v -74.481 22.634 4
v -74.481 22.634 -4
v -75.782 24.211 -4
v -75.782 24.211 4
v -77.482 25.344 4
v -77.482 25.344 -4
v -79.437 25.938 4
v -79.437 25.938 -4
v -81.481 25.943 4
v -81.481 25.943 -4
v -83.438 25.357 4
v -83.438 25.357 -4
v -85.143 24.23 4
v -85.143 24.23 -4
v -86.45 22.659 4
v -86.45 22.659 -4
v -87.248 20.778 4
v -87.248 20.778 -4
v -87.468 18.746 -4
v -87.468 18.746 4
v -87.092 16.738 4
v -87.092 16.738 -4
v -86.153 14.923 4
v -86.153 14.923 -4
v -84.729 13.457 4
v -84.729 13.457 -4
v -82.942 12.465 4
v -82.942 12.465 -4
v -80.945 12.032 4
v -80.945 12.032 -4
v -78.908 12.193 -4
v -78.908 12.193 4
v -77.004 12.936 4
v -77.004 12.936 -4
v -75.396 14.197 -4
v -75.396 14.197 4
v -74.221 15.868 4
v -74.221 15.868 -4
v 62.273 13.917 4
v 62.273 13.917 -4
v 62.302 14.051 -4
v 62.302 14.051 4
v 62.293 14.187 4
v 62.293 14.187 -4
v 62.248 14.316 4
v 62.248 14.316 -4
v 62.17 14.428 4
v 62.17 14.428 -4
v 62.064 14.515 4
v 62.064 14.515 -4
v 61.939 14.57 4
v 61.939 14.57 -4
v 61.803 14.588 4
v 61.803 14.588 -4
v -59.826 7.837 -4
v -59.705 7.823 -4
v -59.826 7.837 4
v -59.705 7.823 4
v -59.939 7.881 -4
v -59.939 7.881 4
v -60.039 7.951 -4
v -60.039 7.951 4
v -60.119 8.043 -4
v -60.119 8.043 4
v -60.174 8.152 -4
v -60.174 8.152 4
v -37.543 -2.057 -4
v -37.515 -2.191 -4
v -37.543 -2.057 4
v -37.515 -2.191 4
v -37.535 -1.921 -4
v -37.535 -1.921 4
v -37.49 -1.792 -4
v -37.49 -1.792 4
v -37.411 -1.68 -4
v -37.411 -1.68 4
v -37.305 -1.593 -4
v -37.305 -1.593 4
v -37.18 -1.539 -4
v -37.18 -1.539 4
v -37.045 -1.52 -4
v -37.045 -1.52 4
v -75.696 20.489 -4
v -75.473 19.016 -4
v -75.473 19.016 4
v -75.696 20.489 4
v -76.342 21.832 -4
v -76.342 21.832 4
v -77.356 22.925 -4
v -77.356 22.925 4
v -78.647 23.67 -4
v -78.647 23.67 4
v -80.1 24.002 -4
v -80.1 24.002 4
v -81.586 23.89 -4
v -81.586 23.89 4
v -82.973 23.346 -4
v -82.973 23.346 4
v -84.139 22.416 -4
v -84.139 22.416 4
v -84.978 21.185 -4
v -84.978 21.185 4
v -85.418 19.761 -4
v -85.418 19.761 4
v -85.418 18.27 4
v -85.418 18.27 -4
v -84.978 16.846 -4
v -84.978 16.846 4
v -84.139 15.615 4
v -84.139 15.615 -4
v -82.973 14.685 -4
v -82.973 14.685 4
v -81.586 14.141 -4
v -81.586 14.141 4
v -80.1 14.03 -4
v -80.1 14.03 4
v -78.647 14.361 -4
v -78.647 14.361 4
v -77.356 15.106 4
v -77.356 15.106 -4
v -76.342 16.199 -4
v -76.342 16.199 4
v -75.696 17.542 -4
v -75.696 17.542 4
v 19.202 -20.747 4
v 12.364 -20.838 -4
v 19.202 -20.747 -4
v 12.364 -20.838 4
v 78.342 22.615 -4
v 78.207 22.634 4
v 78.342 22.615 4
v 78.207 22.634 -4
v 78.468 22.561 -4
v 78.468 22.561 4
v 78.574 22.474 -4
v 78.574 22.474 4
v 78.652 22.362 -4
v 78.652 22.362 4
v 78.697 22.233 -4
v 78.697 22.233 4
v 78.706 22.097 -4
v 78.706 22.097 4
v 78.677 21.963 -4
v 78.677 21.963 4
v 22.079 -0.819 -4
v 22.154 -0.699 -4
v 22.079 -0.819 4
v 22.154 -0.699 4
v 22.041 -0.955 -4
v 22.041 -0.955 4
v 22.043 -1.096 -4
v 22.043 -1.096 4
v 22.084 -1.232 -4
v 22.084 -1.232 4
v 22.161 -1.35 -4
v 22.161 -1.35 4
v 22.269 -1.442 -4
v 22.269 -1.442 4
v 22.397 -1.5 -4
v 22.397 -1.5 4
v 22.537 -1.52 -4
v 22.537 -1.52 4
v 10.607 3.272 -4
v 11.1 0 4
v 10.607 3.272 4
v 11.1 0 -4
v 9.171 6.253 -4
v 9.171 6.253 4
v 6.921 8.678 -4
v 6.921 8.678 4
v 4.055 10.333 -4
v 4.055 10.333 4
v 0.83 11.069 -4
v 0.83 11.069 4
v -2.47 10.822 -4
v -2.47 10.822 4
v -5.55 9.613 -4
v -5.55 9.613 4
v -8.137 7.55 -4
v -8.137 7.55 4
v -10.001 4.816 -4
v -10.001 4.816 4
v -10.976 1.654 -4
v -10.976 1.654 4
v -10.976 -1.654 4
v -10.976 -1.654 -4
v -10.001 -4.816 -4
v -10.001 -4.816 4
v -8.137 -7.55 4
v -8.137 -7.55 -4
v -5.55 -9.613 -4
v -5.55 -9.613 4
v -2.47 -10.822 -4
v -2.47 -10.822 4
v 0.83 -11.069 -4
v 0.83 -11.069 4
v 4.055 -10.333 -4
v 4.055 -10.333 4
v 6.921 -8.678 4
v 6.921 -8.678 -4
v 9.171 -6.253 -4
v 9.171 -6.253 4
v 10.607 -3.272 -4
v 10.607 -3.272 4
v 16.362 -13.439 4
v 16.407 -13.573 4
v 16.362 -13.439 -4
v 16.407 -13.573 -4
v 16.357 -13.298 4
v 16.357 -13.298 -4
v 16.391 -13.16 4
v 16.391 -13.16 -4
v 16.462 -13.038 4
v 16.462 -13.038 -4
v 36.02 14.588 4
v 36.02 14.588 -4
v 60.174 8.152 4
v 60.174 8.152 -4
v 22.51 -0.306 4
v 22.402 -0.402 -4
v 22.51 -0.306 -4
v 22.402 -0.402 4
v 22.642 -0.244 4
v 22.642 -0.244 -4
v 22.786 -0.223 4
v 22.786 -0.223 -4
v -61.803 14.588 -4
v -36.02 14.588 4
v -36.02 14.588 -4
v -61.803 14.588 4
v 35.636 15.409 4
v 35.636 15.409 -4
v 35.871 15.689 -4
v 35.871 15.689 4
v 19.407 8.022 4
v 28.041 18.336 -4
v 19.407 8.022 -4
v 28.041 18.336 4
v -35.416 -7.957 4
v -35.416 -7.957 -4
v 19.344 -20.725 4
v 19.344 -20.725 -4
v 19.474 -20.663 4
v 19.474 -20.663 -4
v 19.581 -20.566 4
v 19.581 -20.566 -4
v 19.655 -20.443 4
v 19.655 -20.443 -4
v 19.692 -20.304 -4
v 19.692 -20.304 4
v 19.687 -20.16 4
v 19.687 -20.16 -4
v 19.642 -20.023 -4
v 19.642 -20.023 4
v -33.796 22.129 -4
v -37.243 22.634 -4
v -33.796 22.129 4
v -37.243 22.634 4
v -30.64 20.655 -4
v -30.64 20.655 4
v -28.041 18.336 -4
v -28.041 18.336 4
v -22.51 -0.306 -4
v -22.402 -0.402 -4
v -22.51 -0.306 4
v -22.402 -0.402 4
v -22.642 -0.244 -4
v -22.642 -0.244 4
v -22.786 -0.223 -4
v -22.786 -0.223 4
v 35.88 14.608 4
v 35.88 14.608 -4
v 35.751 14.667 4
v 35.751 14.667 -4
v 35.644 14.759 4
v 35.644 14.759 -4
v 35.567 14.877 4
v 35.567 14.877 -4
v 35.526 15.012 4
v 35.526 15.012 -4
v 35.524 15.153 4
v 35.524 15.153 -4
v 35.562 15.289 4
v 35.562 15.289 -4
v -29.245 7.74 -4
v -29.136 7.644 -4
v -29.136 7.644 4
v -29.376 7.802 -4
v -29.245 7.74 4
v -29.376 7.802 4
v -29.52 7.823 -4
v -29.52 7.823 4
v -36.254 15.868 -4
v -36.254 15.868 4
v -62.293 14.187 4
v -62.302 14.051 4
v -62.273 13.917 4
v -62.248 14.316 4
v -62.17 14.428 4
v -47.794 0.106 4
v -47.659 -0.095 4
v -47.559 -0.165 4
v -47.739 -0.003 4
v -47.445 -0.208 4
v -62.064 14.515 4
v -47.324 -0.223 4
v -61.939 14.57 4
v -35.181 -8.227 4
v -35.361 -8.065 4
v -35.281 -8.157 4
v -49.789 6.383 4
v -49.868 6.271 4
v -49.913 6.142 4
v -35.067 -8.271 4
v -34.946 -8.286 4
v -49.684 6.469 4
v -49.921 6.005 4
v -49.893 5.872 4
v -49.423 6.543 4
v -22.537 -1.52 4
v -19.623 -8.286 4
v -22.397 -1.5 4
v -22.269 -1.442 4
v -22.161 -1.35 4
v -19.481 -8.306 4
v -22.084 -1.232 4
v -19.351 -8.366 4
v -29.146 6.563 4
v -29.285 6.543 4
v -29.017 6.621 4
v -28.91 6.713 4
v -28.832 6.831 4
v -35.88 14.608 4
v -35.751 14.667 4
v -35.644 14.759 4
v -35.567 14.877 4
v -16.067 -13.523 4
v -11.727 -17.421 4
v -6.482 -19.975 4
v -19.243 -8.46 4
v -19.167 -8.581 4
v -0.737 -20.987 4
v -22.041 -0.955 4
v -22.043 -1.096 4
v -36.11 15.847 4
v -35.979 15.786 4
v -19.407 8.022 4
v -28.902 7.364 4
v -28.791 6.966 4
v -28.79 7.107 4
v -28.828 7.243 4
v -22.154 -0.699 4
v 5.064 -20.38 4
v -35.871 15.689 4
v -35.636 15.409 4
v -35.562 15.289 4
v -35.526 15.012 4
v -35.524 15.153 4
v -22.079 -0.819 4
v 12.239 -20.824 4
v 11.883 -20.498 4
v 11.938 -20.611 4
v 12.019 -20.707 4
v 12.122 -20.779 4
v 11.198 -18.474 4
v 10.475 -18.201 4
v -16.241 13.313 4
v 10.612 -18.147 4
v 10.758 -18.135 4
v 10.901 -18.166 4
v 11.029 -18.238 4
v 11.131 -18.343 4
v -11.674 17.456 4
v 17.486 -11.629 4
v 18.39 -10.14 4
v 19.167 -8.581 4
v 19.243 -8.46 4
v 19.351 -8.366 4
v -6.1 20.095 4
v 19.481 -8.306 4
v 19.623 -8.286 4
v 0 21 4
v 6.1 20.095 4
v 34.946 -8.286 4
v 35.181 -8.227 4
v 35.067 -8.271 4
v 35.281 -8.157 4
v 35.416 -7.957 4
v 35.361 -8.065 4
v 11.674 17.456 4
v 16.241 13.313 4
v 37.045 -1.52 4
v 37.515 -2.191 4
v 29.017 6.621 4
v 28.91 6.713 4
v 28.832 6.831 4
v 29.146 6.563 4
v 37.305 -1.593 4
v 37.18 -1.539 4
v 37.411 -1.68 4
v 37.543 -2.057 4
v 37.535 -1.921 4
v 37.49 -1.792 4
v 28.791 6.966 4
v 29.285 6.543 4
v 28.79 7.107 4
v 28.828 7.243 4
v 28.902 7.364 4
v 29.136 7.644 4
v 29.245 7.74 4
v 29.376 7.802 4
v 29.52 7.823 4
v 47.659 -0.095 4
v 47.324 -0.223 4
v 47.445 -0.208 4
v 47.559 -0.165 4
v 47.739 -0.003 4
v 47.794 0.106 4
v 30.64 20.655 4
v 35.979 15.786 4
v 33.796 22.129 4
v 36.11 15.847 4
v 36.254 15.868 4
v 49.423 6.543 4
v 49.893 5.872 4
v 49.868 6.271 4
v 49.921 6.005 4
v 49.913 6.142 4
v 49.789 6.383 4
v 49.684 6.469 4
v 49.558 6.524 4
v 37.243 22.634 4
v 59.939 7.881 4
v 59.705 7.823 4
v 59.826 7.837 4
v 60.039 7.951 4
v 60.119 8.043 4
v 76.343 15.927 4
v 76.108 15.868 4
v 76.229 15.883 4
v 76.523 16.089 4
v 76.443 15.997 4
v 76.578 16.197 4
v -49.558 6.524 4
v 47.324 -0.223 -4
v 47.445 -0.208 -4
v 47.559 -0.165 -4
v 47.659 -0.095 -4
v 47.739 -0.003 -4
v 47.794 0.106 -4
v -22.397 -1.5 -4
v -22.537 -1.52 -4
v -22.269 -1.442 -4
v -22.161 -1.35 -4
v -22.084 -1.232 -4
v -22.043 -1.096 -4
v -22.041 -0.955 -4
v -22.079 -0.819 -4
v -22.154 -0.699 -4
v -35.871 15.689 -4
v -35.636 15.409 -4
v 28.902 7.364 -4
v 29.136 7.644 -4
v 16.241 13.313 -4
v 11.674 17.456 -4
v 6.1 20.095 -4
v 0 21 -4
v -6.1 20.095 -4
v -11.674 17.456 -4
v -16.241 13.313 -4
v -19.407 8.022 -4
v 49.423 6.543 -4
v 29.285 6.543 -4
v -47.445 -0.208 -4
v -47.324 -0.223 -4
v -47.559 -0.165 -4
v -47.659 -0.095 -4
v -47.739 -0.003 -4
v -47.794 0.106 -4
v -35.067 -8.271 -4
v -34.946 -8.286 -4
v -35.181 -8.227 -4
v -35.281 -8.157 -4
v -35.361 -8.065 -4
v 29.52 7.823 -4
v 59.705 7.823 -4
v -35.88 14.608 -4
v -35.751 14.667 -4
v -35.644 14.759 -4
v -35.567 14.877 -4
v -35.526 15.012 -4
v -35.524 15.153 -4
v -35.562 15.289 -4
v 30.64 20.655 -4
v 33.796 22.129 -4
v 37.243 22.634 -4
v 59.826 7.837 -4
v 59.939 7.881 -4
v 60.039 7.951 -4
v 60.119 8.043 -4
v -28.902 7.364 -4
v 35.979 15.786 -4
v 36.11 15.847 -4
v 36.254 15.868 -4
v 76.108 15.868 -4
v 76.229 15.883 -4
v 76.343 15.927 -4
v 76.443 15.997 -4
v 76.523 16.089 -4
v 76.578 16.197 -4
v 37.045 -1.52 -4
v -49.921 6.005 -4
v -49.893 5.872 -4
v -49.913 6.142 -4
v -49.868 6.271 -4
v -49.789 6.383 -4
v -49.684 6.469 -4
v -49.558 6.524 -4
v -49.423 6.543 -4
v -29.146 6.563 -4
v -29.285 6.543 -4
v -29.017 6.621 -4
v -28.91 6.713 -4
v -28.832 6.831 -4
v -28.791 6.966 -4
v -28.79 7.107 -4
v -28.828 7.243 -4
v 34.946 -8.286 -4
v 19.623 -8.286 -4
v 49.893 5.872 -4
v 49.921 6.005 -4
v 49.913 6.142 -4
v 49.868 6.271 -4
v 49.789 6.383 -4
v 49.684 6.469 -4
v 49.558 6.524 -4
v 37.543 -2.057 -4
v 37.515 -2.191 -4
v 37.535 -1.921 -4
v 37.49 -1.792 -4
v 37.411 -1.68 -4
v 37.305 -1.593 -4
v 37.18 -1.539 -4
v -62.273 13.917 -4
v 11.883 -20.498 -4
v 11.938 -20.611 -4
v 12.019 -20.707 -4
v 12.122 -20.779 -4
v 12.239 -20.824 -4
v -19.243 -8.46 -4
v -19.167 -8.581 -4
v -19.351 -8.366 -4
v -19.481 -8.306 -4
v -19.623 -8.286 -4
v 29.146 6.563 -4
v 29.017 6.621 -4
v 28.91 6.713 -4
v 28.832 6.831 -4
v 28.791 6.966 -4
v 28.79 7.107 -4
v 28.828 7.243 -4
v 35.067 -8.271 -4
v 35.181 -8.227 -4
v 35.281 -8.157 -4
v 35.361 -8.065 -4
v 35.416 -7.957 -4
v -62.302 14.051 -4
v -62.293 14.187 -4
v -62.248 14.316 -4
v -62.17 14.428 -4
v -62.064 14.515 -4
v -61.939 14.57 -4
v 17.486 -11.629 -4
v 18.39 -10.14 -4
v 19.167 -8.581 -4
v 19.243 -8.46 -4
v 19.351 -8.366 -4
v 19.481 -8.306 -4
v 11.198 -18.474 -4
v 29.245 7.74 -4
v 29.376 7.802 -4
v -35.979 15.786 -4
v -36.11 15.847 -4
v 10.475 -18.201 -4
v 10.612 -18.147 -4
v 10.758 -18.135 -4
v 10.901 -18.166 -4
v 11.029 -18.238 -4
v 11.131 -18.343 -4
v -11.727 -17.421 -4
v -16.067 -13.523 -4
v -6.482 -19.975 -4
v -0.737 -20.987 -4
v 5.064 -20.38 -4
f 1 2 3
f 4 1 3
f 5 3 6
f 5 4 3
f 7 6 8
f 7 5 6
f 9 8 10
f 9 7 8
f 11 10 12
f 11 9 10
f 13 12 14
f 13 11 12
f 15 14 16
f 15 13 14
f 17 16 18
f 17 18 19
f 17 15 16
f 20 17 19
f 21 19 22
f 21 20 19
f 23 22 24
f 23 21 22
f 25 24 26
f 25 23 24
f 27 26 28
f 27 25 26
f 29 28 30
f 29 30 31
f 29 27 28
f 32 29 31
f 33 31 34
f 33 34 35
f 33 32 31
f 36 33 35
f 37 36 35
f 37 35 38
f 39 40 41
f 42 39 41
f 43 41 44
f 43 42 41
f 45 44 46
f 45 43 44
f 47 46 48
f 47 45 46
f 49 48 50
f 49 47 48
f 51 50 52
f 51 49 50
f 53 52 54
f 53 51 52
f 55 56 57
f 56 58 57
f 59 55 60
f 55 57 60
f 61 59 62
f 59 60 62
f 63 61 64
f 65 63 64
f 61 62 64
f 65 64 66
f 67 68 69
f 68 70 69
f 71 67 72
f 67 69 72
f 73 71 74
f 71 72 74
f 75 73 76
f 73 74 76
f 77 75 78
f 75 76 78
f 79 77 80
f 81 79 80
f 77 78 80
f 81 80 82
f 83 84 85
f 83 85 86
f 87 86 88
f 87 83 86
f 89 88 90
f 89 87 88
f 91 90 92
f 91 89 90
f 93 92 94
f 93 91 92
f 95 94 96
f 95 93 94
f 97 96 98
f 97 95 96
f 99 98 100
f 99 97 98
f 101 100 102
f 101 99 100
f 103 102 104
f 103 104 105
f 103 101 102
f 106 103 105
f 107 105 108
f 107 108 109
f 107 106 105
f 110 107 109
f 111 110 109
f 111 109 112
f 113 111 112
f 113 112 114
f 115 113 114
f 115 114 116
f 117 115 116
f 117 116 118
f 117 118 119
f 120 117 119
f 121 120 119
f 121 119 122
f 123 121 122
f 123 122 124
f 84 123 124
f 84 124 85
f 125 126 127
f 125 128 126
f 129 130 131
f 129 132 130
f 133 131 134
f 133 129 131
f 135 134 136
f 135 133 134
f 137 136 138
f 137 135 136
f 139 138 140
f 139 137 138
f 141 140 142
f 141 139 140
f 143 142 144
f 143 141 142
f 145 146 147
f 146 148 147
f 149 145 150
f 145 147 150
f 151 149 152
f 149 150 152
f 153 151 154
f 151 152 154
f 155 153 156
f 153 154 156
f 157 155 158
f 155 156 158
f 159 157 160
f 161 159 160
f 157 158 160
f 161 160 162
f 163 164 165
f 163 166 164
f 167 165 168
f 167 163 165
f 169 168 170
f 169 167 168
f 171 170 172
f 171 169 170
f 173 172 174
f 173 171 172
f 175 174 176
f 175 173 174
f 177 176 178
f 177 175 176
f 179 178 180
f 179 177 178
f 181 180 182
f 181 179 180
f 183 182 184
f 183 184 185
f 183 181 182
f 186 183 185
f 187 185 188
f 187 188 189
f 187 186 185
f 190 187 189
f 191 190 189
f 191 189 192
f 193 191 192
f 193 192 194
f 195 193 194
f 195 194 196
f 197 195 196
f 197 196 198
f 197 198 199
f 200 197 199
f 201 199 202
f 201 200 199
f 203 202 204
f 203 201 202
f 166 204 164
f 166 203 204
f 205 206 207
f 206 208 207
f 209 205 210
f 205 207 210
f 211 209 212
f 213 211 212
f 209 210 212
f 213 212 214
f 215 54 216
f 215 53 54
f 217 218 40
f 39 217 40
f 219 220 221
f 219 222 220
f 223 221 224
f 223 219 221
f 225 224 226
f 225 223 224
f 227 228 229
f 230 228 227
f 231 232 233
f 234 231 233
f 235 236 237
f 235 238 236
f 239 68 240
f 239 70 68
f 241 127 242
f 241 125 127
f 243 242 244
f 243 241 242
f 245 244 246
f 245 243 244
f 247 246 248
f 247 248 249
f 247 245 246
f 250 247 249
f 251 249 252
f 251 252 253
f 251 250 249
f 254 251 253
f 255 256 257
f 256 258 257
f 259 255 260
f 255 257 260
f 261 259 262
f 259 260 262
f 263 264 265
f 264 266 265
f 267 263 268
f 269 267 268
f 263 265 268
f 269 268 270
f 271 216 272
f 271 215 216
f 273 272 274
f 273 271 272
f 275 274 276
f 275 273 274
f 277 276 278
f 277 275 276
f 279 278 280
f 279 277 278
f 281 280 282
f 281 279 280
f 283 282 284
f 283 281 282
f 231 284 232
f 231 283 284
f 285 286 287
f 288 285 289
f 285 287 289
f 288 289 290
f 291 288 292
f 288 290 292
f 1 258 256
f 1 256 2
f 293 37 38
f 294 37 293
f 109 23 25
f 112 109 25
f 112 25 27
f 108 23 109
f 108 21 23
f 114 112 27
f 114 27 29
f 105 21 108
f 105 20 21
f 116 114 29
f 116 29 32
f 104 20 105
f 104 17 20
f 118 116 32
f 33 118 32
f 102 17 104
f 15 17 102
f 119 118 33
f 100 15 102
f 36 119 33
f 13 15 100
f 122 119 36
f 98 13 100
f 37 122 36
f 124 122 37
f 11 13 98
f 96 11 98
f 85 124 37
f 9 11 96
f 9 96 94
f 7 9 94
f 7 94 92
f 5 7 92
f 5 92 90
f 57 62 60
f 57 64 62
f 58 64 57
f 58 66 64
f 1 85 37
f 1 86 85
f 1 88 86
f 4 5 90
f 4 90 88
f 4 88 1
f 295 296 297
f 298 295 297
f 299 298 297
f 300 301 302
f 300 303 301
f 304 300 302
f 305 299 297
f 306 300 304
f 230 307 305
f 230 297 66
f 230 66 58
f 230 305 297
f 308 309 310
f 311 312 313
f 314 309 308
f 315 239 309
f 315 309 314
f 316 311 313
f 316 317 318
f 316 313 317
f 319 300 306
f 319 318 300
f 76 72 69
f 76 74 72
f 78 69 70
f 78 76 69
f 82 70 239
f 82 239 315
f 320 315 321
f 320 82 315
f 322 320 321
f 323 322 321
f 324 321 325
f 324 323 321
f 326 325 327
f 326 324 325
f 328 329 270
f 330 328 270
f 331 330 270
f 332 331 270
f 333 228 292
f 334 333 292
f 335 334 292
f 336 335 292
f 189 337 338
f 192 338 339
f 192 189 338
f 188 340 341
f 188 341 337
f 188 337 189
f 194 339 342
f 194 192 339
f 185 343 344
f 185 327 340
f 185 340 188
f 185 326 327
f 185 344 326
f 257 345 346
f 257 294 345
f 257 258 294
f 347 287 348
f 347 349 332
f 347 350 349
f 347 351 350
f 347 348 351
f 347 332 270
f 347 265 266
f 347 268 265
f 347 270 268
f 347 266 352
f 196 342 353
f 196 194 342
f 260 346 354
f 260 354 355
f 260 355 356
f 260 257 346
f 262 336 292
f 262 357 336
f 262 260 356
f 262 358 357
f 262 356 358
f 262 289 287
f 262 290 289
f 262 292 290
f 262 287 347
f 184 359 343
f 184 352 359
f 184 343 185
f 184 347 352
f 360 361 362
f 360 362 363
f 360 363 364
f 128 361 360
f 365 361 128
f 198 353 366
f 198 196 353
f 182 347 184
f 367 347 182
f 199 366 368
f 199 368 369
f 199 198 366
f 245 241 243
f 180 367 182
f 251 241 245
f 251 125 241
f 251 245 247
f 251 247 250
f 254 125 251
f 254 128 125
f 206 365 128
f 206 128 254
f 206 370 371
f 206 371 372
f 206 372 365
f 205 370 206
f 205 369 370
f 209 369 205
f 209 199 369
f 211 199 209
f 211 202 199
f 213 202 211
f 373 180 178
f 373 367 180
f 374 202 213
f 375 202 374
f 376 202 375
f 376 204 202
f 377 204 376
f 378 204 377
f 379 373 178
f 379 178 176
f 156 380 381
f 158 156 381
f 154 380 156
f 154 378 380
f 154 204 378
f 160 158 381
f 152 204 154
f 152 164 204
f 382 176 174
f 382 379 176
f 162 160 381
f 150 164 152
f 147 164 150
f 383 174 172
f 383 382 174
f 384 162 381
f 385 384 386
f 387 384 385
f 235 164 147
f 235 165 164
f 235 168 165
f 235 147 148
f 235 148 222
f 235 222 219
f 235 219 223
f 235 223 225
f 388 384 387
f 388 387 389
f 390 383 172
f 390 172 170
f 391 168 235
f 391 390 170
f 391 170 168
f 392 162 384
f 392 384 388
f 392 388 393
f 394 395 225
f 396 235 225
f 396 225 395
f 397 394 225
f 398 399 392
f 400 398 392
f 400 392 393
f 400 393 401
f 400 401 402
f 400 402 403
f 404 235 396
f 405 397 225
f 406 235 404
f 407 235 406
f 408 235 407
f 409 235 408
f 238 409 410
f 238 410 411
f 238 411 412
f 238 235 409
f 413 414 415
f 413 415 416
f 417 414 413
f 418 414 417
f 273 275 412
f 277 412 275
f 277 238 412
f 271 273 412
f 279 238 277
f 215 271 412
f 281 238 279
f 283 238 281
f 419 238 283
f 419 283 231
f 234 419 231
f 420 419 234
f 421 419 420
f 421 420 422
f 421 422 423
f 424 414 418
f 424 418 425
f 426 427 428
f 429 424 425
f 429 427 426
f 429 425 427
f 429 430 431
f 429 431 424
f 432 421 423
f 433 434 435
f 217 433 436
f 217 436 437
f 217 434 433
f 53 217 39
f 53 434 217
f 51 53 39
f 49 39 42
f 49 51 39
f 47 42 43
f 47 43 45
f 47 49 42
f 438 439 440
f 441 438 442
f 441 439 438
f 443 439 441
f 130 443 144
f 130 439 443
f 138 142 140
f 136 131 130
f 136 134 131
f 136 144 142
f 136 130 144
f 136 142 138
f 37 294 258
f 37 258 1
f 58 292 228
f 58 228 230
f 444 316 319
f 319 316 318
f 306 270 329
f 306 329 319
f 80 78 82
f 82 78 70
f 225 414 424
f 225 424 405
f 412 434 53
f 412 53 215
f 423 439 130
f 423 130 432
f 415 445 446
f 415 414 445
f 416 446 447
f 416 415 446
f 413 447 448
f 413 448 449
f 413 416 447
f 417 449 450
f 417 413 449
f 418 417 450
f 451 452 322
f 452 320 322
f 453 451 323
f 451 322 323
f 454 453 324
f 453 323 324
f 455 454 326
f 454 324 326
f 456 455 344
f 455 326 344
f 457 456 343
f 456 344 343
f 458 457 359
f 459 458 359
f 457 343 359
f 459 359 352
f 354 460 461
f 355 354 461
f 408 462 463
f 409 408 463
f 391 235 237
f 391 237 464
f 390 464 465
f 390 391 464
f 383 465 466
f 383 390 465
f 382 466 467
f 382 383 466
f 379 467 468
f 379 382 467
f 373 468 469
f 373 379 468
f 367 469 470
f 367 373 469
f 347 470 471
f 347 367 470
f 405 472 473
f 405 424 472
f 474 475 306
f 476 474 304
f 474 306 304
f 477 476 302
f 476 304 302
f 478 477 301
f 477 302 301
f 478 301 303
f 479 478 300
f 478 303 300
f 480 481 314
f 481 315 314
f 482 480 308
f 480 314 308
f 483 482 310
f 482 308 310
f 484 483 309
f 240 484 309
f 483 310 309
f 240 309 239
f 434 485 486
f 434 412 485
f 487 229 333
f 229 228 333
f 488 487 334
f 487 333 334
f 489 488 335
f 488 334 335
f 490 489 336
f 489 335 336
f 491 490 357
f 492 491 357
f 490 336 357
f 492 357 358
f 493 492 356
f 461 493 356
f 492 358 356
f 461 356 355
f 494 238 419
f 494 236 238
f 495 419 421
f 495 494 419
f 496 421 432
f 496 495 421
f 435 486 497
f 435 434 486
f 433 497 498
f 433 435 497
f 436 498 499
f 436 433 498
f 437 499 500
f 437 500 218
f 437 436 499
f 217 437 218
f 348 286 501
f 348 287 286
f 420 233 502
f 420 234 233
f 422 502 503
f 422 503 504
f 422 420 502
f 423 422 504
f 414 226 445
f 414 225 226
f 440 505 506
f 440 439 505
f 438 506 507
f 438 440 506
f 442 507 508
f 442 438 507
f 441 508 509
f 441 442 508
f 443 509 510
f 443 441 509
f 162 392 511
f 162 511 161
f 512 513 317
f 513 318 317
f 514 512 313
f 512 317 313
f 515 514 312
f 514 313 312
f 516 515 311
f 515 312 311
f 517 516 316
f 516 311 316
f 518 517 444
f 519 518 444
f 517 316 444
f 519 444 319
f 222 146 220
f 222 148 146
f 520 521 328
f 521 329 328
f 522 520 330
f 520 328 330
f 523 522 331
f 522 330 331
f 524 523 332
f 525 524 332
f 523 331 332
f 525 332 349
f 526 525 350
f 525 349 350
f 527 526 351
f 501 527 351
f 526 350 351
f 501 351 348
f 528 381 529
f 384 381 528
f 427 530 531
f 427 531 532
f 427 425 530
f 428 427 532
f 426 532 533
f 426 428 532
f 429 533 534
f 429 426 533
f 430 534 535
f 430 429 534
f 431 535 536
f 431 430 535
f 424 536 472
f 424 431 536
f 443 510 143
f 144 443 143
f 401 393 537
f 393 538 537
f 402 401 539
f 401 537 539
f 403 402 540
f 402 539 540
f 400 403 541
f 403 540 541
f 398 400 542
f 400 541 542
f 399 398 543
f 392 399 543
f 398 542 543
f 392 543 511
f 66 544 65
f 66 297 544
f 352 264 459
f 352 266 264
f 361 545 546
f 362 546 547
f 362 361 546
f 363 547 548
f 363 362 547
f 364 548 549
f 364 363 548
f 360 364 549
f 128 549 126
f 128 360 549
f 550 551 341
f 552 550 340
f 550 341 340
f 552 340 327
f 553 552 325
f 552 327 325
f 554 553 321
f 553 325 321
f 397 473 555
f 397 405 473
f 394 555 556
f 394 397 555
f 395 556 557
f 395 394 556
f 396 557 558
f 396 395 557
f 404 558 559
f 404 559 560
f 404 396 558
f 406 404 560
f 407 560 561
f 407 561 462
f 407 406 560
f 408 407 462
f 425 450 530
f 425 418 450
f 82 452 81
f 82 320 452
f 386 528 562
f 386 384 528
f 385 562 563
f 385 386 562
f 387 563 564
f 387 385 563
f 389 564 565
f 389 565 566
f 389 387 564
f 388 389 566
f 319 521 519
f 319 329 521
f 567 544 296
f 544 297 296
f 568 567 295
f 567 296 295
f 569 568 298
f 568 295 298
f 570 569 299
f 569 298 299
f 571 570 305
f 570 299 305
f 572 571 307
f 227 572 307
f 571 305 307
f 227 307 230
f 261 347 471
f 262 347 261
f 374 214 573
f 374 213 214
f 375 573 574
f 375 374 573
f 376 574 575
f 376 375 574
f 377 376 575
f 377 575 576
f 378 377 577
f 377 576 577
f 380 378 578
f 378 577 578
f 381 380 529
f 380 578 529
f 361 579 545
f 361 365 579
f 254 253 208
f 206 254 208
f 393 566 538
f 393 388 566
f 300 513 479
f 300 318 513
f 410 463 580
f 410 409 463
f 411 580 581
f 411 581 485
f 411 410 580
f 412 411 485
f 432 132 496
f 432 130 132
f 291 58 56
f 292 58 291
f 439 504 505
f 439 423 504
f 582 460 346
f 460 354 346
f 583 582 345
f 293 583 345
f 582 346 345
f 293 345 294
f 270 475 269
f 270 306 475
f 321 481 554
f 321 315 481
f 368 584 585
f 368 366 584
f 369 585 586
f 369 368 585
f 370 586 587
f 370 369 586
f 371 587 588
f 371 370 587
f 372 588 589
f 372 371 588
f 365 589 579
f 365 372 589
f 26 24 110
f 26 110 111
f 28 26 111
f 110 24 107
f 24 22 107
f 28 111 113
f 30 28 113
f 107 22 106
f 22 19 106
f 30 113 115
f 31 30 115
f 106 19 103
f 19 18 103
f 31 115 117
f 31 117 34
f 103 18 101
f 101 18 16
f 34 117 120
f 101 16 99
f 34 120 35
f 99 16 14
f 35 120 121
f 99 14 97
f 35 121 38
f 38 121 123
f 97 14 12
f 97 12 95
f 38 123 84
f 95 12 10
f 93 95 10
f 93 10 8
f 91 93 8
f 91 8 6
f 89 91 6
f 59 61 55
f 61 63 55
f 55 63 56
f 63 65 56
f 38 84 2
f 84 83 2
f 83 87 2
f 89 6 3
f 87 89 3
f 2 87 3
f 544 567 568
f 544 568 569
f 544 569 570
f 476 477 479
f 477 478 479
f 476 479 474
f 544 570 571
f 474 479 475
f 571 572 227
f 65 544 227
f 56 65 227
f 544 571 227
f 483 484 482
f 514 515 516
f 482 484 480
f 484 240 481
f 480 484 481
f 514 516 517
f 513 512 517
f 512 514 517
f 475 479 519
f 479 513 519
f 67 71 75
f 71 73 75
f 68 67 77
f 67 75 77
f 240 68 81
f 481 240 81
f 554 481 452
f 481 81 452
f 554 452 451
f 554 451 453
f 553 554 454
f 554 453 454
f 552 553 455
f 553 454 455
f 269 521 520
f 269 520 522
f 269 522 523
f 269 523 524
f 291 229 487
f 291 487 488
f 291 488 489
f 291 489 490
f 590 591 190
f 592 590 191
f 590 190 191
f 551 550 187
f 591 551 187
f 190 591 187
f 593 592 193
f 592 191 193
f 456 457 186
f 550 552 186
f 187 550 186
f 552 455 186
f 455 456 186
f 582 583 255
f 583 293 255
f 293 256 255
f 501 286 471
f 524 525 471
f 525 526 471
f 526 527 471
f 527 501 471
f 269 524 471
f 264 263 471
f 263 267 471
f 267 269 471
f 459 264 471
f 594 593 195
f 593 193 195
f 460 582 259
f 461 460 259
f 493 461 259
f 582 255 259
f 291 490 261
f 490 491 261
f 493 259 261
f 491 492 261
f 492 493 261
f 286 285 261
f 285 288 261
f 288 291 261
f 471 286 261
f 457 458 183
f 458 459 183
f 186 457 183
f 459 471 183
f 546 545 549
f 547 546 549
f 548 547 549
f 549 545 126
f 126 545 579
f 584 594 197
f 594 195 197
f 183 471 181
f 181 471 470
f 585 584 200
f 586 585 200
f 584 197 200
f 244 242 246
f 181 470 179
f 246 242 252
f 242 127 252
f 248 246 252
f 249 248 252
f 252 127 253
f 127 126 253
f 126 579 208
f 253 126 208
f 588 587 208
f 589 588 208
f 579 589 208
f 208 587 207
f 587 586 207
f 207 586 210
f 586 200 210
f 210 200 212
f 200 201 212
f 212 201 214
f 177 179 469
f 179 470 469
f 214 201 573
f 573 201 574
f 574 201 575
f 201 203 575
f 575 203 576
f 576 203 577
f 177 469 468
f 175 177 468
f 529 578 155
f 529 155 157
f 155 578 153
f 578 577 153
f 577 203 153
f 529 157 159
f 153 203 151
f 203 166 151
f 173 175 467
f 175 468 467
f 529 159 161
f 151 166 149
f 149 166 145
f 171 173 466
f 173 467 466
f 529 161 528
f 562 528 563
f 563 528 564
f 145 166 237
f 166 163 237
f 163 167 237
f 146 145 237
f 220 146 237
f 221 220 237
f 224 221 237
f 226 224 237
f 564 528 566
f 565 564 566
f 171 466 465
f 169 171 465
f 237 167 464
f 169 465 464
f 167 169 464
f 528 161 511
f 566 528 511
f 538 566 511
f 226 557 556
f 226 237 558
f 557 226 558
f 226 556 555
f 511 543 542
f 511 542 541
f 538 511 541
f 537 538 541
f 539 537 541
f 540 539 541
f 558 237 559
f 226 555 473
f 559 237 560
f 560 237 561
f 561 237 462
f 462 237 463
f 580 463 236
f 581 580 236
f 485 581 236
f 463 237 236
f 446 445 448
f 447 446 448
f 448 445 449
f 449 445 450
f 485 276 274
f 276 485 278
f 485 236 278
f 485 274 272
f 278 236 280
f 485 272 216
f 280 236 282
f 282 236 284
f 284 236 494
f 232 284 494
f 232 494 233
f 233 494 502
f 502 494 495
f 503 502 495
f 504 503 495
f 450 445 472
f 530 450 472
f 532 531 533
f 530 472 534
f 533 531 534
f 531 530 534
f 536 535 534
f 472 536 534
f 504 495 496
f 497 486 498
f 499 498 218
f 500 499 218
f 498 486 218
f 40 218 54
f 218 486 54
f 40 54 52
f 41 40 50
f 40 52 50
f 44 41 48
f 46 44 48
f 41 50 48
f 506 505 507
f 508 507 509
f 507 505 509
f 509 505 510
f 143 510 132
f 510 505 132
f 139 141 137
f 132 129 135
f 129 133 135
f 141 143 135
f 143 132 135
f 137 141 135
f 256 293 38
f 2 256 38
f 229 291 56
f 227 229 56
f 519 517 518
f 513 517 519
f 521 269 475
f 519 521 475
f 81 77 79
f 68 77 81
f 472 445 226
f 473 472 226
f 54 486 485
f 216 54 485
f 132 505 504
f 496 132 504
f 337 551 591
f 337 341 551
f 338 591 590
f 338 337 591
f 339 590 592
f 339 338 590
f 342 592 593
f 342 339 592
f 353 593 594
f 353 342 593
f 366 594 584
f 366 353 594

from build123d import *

# Parameters (mm, degrees)
F0_R     = 11.1
F1_DEPTH = 4
F2_DEPTH = 4
F3_DEPTH = 4
F4_DEPTH = 4
F5_R     = 0.5
F6_R     = 7
F6_R_2   = 5
F7_DEPTH = 4
F8_R     = 5
F9_DEPTH = 25
F10_R    = 12


# Not quite as in the source:
# - a feature names something its author has since deleted; it is built from what else it names


with BuildPart() as f1:
    # F0 (on Top) → F1 (new body, symmetric)
    with BuildSketch(Plane.XY):
        with BuildLine():
            ThreePointArc((20.944924, -1.519927), (20.986226, -0.760462), (21, 0))
            ThreePointArc((21, 0), (20.598026, 4.089169), (19.407495, 8.021792))
            ThreePointArc((19.407495, 8.021792), (0, 21), (-19.407495, 8.021792))
            ThreePointArc((-19.407495, 8.021792), (-20.732595, 3.340581), (-20.944924, -1.519927))
            ThreePointArc((-20.944924, -1.519927), (-20.403011, -4.971634), (-19.296293, -8.285714))
            ThreePointArc((-19.296293, -8.285714), (-6.345132, -20.018474), (11, -17.888544))
            ThreePointArc((11, -17.888544), (13.82448, -15.807712), (16.263142, -13.285714))
            ThreePointArc((16.263142, -13.285714), (17.95462, -10.891815), (19.296293, -8.285714))
            ThreePointArc((19.296293, -8.285714), (20.403011, -4.971634), (20.944924, -1.519927))
        make_face()
        Circle(F0_R, mode=Mode.SUBTRACT)
        with BuildLine():
            Line((20, -20.736863), (16.263142, -13.285714))
            ThreePointArc((16.263142, -13.285714), (13.82448, -15.807712), (11, -17.888544))
            Line((11, -17.888544), (12, -20.842855))
            Line((12, -20.842855), (20, -20.736863))
        make_face()
    extrude(amount=F1_DEPTH, both=True)

    # F0 (on Top) → F2 (join, symmetric)
    with BuildSketch(Plane.XY):
        with BuildLine():
            Line((21.466717, -1.519927), (20.944924, -1.519927))
            ThreePointArc((20.944924, -1.519927), (20.403011, -4.971634), (19.296293, -8.285714))
            Line((19.296293, -8.285714), (35.296293, -8.285714))
            Line((35.296293, -8.285714), (37.758838, -1.519927))
            Line((37.758838, -1.519927), (21.466717, -1.519927))
        make_face()
    extrude(amount=F2_DEPTH, both=True)

    # F0 (on Top) → F3 (join, symmetric)
    with BuildSketch(Plane.XY):
        with BuildLine():
            ThreePointArc((19.407495, 8.021792), (20.598026, 4.089169), (21, 0))
            ThreePointArc((21, 0), (20.986226, -0.760462), (20.944924, -1.519927))
            Line((20.944924, -1.519927), (21.466717, -1.519927))
            Line((21.466717, -1.519927), (22.552058, -0.223202))
            Line((22.552058, -0.223202), (22.998917, -0.223202))
            Line((22.998917, -0.223202), (47.674407, -0.223202))
            Line((47.674407, -0.223202), (50.136952, 6.542585))
            Line((50.136952, 6.542585), (29.636583, 6.542585))
            Line((29.636583, 6.542585), (28.214928, 6.542585))
            Line((28.214928, 6.542585), (29.28627, 7.822585))
            Line((29.28627, 7.822585), (47.431346, 7.822585))
            Line((47.431346, 7.822585), (60.054694, 7.822585))
            Line((60.054694, 7.822585), (62.517239, 14.588372))
            Line((62.517239, 14.588372), (43.96666, 14.588372))
            Line((43.96666, 14.588372), (34.94914, 14.588372))
            Line((34.94914, 14.588372), (36.020482, 15.868372))
            Line((36.020482, 15.868372), (54.509119, 15.868372))
            Line((54.509119, 15.868372), (62.740314, 15.868372))
            Line((62.740314, 15.868372), (76.458602, 15.868372))
            Line((76.458602, 15.868372), (78.921147, 22.634159))
            Line((78.921147, 22.634159), (31.637842, 22.634159))
            Line((31.637842, 22.634159), (19.407495, 8.021792))
        make_face()
    extrude(amount=F3_DEPTH, both=True)

    # F0 (on Top) → F4 (join, symmetric)
    with BuildSketch(Plane.XY):
        with BuildLine():
            ThreePointArc((20.944924, -1.519927), (20.986226, -0.760462), (21, 0))
            ThreePointArc((21, 0), (20.598026, 4.089169), (19.407495, 8.021792))
            ThreePointArc((19.407495, 8.021792), (0, 21), (-19.407495, 8.021792))
            ThreePointArc((-19.407495, 8.021792), (-20.732595, 3.340581), (-20.944924, -1.519927))
            ThreePointArc((-20.944924, -1.519927), (-20.403011, -4.971634), (-19.296293, -8.285714))
            ThreePointArc((-19.296293, -8.285714), (-6.345132, -20.018474), (11, -17.888544))
            ThreePointArc((11, -17.888544), (13.82448, -15.807712), (16.263142, -13.285714))
            ThreePointArc((16.263142, -13.285714), (17.95462, -10.891815), (19.296293, -8.285714))
            ThreePointArc((19.296293, -8.285714), (20.403011, -4.971634), (20.944924, -1.519927))
        make_face()
        Circle(F0_R, mode=Mode.SUBTRACT)
        with BuildLine():
            ThreePointArc((19.407495, 8.021792), (20.598026, 4.089169), (21, 0))
            ThreePointArc((21, 0), (20.986226, -0.760462), (20.944924, -1.519927))
            Line((20.944924, -1.519927), (21.466717, -1.519927))
            Line((21.466717, -1.519927), (22.552058, -0.223202))
            Line((22.552058, -0.223202), (22.998917, -0.223202))
            Line((22.998917, -0.223202), (47.674407, -0.223202))
            Line((47.674407, -0.223202), (50.136952, 6.542585))
            Line((50.136952, 6.542585), (29.636583, 6.542585))
            Line((29.636583, 6.542585), (28.214928, 6.542585))
            Line((28.214928, 6.542585), (29.28627, 7.822585))
            Line((29.28627, 7.822585), (47.431346, 7.822585))
            Line((47.431346, 7.822585), (60.054694, 7.822585))
            Line((60.054694, 7.822585), (62.517239, 14.588372))
            Line((62.517239, 14.588372), (43.96666, 14.588372))
            Line((43.96666, 14.588372), (34.94914, 14.588372))
            Line((34.94914, 14.588372), (36.020482, 15.868372))
            Line((36.020482, 15.868372), (54.509119, 15.868372))
            Line((54.509119, 15.868372), (62.740314, 15.868372))
            Line((62.740314, 15.868372), (76.458602, 15.868372))
            Line((76.458602, 15.868372), (78.921147, 22.634159))
            Line((78.921147, 22.634159), (31.637842, 22.634159))
            Line((31.637842, 22.634159), (19.407495, 8.021792))
        make_face()
        with BuildLine():
            Line((21.466717, -1.519927), (20.944924, -1.519927))
            ThreePointArc((20.944924, -1.519927), (20.403011, -4.971634), (19.296293, -8.285714))
            Line((19.296293, -8.285714), (35.296293, -8.285714))
            Line((35.296293, -8.285714), (37.758838, -1.519927))
            Line((37.758838, -1.519927), (21.466717, -1.519927))
        make_face()
        with BuildLine():
            ThreePointArc((-20.944924, -1.519927), (-20.732595, 3.340581), (-19.407495, 8.021792))
            Line((-19.407495, 8.021792), (-31.637842, 22.634159))
            Line((-31.637842, 22.634159), (-78.921147, 22.634159))
            Line((-78.921147, 22.634159), (-76.458602, 15.868372))
            Line((-76.458602, 15.868372), (-62.740314, 15.868372))
            Line((-62.740314, 15.868372), (-54.509119, 15.868372))
            Line((-54.509119, 15.868372), (-36.020482, 15.868372))
            Line((-36.020482, 15.868372), (-34.94914, 14.588372))
            Line((-34.94914, 14.588372), (-43.96666, 14.588372))
            Line((-43.96666, 14.588372), (-62.517239, 14.588372))
            Line((-62.517239, 14.588372), (-60.054694, 7.822585))
            Line((-60.054694, 7.822585), (-47.431346, 7.822585))
            Line((-47.431346, 7.822585), (-29.28627, 7.822585))
            Line((-29.28627, 7.822585), (-28.214928, 6.542585))
            Line((-28.214928, 6.542585), (-29.636583, 6.542585))
            Line((-29.636583, 6.542585), (-50.136952, 6.542585))
            Line((-50.136952, 6.542585), (-47.674407, -0.223202))
            Line((-47.674407, -0.223202), (-22.552058, -0.223202))
            Line((-22.552058, -0.223202), (-21.466717, -1.519927))
            Line((-21.466717, -1.519927), (-20.944924, -1.519927))
        make_face()
        with BuildLine():
            ThreePointArc((-19.296293, -8.285714), (-20.403011, -4.971634), (-20.944924, -1.519927))
            Line((-20.944924, -1.519927), (-21.466717, -1.519927))
            Line((-21.466717, -1.519927), (-37.758838, -1.519927))
            Line((-37.758838, -1.519927), (-35.296293, -8.285714))
            Line((-35.296293, -8.285714), (-19.296293, -8.285714))
        make_face()
        with BuildLine():
            Line((20, -20.736863), (16.263142, -13.285714))
            ThreePointArc((16.263142, -13.285714), (13.82448, -15.807712), (11, -17.888544))
            Line((11, -17.888544), (12, -20.842855))
            Line((12, -20.842855), (20, -20.736863))
        make_face()
    extrude(amount=F4_DEPTH, both=True)

    # F5
    f5_edges = [f1.edges().sort_by_distance(p)[0] for p in [
        (-36.020482, 15.868372, 0),
        (-29.28627, 7.822585, 0),
        (-22.552058, -0.223202, 0),
        (-19.296293, -8.285714, 0),
        (-21.466717, -1.519927, 0),
        (-28.214928, 6.542585, 0),
        (-34.94914, 14.588372, 0),
        (-78.921147, 22.634159, 0),
        (-76.458602, 15.868372, 0),
        (-62.517239, 14.588372, 0),
        (-60.054694, 7.822585, 0),
        (-50.136952, 6.542585, 0),
        (-37.758838, -1.519927, 0),
        (-35.296293, -8.285714, 0),
        (-47.674407, -0.223202, 0),
        (78.921147, 22.634159, 0),
        (76.458602, 15.868372, 0),
        (62.517239, 14.588372, 0),
        (60.054694, 7.822585, 0),
        (50.136952, 6.542585, 0),
        (37.758838, -1.519927, 0),
        (35.296293, -8.285714, 0),
        (47.674407, -0.223202, 0),
        (21.466717, -1.519927, 0),
        (28.214928, 6.542585, 0),
        (34.94914, 14.588372, 0),
        (36.020482, 15.868372, 0),
        (29.28627, 7.822585, 0),
        (22.552058, -0.223202, 0),
        (19.296293, -8.285714, 0),
        (20, -20.736863, 0),
        (12, -20.842855, 0),
        (11, -17.888544, 0),
        (16.263142, -13.285714, 0),
    ]]
    fillet(f5_edges, radius=F5_R)

    # F6 (on Top) → F7 (join, symmetric)
    with BuildSketch(Plane.XY):
        with Locations((-80.473438, 19.015618)):
            Circle(F6_R)
        with Locations((-80.473438, 19.015618)):
            Circle(F6_R_2, mode=Mode.SUBTRACT)
    extrude(amount=F7_DEPTH, both=True)

    # F8 (on face) → F9 (cut)
    with BuildSketch(Plane.XY.offset(4)):
        with Locations((-80.473438, 19.015618)):
            Circle(F8_R)
    extrude(amount=-F9_DEPTH, mode=Mode.SUBTRACT)

    # F10
    f10_edges = [f1.edges().sort_by_distance(p)[0] for p in [
        (-31.637842, 22.634159, 0),
        (31.637842, 22.634159, 0),
    ]]
    fillet(f10_edges, radius=F10_R)


solid = f1.part
